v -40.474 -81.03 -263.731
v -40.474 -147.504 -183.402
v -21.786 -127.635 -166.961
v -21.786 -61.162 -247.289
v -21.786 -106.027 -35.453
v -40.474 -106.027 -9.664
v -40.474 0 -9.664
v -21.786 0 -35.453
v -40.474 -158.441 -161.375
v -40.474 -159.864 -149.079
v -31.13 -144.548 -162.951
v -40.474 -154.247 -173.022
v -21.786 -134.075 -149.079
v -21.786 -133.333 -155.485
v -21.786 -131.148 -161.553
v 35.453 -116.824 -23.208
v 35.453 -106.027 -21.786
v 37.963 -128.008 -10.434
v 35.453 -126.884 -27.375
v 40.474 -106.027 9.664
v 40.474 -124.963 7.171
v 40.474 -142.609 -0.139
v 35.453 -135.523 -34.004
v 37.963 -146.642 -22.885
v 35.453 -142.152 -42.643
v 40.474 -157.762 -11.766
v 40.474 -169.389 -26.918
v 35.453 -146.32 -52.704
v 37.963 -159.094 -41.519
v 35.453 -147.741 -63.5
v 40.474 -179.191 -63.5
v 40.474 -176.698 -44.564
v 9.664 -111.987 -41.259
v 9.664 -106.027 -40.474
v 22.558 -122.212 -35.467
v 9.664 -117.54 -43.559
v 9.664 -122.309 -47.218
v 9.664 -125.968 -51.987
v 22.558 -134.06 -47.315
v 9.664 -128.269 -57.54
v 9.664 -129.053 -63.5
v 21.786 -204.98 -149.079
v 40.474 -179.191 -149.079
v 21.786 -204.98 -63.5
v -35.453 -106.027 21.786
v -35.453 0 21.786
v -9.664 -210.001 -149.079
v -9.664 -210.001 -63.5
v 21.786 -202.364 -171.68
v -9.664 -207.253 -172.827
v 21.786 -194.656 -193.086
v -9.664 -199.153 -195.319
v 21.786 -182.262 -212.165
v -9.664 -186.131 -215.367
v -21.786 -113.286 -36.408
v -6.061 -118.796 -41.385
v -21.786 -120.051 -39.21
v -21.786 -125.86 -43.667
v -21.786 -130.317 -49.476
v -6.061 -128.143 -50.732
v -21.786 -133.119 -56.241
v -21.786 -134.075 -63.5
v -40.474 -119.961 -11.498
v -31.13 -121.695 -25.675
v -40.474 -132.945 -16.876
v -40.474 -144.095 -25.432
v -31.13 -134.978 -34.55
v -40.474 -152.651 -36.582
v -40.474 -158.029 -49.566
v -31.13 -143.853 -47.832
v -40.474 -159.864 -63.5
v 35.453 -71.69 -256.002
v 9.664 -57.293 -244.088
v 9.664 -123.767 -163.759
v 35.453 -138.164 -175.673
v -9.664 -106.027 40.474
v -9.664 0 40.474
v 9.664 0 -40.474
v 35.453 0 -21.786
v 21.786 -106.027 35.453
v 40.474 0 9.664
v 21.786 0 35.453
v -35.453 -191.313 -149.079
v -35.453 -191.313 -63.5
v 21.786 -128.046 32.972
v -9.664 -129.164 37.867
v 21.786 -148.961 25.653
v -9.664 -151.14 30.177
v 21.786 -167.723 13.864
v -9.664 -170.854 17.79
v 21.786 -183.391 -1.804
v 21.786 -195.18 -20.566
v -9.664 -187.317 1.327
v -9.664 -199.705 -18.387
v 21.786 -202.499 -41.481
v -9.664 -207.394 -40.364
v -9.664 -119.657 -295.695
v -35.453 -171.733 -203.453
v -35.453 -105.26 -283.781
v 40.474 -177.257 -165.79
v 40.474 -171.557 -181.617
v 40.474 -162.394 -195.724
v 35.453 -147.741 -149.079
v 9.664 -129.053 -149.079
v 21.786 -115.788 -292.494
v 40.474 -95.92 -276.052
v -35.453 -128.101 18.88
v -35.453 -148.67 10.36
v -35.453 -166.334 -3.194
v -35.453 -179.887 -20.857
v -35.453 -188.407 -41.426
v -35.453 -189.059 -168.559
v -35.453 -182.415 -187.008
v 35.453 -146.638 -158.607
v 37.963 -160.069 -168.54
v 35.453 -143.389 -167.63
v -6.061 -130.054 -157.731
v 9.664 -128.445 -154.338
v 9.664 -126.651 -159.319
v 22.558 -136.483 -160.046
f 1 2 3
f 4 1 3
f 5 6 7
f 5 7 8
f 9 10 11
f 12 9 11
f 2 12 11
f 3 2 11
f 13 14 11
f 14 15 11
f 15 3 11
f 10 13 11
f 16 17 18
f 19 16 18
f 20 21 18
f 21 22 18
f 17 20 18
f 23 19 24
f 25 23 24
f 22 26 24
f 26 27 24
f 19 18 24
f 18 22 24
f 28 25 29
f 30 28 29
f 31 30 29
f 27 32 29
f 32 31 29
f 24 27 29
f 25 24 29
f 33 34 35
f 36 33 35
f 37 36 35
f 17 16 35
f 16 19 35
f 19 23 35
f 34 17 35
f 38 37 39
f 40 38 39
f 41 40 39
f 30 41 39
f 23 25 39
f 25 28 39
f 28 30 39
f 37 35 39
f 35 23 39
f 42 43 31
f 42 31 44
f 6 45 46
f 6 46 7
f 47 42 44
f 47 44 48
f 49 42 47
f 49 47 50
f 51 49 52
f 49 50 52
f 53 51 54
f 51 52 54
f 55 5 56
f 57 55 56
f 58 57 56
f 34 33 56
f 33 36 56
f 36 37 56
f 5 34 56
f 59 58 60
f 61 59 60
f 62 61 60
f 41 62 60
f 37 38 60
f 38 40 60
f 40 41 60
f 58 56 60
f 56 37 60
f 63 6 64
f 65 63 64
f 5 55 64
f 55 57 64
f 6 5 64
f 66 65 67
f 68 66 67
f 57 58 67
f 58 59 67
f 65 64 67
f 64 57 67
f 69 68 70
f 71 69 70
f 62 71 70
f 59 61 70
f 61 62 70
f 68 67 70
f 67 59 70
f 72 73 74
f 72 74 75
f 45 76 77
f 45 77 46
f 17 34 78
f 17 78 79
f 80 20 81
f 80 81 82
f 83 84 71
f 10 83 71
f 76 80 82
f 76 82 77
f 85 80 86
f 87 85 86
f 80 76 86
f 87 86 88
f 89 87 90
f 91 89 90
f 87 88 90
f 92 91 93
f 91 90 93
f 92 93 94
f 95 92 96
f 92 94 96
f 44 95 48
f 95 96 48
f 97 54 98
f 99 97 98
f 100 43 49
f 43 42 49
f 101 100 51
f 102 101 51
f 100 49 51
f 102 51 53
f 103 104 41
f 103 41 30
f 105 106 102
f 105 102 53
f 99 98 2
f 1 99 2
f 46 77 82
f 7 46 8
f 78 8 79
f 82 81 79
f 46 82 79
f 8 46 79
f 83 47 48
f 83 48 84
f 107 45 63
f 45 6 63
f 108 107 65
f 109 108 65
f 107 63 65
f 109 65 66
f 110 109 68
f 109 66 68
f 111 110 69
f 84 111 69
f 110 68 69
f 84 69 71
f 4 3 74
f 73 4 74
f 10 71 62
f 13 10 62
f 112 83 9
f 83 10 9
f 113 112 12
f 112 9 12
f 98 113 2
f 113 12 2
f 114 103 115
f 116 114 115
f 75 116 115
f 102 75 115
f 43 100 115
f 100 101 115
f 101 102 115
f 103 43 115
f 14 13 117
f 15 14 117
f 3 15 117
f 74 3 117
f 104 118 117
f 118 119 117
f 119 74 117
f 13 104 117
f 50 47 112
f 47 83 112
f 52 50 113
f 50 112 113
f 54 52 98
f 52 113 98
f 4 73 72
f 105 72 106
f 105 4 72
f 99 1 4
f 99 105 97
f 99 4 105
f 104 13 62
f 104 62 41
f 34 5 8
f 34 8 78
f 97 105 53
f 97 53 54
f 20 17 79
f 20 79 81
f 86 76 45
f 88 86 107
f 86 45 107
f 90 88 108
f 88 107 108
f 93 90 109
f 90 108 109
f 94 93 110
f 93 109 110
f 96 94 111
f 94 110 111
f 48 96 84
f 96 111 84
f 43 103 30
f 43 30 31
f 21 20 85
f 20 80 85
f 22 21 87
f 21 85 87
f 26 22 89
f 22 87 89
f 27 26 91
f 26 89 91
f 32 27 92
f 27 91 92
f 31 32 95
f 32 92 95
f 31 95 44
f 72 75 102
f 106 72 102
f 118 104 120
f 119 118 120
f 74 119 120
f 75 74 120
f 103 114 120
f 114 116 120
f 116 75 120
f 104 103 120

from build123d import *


with BuildPart() as f2:
    # F2: sweep along a path in F1
    with BuildLine(Plane.YZ) as f2_path:
        Line((0, 0), (-106.027229, 0))
        ThreePointArc((-106.027229, 0), (-150.92851, -18.598719), (-169.527229, -63.5))
        Line((-169.527229, -63.5), (-169.527229, -149.079217))
        ThreePointArc((-169.527229, -149.079217), (-165.771549, -170.593545), (-154.948762, -189.562962))
        Line((-154.948762, -189.562962), (-88.474994, -269.891465))
    # F0 (on Front) → F2 (sweep)
    with BuildSketch(Plane.XZ):
        Polygon((-35.452579, 21.786269), (-40.473978, -9.663541), (-21.786269, -35.452579), (9.663541, -40.473978), (35.452579, -21.786269), (40.473978, 9.663541), (21.786269, 35.452579), (-9.663541, 40.473978), align=None)
    sweep(path=f2_path.line)


solid = f2.part
